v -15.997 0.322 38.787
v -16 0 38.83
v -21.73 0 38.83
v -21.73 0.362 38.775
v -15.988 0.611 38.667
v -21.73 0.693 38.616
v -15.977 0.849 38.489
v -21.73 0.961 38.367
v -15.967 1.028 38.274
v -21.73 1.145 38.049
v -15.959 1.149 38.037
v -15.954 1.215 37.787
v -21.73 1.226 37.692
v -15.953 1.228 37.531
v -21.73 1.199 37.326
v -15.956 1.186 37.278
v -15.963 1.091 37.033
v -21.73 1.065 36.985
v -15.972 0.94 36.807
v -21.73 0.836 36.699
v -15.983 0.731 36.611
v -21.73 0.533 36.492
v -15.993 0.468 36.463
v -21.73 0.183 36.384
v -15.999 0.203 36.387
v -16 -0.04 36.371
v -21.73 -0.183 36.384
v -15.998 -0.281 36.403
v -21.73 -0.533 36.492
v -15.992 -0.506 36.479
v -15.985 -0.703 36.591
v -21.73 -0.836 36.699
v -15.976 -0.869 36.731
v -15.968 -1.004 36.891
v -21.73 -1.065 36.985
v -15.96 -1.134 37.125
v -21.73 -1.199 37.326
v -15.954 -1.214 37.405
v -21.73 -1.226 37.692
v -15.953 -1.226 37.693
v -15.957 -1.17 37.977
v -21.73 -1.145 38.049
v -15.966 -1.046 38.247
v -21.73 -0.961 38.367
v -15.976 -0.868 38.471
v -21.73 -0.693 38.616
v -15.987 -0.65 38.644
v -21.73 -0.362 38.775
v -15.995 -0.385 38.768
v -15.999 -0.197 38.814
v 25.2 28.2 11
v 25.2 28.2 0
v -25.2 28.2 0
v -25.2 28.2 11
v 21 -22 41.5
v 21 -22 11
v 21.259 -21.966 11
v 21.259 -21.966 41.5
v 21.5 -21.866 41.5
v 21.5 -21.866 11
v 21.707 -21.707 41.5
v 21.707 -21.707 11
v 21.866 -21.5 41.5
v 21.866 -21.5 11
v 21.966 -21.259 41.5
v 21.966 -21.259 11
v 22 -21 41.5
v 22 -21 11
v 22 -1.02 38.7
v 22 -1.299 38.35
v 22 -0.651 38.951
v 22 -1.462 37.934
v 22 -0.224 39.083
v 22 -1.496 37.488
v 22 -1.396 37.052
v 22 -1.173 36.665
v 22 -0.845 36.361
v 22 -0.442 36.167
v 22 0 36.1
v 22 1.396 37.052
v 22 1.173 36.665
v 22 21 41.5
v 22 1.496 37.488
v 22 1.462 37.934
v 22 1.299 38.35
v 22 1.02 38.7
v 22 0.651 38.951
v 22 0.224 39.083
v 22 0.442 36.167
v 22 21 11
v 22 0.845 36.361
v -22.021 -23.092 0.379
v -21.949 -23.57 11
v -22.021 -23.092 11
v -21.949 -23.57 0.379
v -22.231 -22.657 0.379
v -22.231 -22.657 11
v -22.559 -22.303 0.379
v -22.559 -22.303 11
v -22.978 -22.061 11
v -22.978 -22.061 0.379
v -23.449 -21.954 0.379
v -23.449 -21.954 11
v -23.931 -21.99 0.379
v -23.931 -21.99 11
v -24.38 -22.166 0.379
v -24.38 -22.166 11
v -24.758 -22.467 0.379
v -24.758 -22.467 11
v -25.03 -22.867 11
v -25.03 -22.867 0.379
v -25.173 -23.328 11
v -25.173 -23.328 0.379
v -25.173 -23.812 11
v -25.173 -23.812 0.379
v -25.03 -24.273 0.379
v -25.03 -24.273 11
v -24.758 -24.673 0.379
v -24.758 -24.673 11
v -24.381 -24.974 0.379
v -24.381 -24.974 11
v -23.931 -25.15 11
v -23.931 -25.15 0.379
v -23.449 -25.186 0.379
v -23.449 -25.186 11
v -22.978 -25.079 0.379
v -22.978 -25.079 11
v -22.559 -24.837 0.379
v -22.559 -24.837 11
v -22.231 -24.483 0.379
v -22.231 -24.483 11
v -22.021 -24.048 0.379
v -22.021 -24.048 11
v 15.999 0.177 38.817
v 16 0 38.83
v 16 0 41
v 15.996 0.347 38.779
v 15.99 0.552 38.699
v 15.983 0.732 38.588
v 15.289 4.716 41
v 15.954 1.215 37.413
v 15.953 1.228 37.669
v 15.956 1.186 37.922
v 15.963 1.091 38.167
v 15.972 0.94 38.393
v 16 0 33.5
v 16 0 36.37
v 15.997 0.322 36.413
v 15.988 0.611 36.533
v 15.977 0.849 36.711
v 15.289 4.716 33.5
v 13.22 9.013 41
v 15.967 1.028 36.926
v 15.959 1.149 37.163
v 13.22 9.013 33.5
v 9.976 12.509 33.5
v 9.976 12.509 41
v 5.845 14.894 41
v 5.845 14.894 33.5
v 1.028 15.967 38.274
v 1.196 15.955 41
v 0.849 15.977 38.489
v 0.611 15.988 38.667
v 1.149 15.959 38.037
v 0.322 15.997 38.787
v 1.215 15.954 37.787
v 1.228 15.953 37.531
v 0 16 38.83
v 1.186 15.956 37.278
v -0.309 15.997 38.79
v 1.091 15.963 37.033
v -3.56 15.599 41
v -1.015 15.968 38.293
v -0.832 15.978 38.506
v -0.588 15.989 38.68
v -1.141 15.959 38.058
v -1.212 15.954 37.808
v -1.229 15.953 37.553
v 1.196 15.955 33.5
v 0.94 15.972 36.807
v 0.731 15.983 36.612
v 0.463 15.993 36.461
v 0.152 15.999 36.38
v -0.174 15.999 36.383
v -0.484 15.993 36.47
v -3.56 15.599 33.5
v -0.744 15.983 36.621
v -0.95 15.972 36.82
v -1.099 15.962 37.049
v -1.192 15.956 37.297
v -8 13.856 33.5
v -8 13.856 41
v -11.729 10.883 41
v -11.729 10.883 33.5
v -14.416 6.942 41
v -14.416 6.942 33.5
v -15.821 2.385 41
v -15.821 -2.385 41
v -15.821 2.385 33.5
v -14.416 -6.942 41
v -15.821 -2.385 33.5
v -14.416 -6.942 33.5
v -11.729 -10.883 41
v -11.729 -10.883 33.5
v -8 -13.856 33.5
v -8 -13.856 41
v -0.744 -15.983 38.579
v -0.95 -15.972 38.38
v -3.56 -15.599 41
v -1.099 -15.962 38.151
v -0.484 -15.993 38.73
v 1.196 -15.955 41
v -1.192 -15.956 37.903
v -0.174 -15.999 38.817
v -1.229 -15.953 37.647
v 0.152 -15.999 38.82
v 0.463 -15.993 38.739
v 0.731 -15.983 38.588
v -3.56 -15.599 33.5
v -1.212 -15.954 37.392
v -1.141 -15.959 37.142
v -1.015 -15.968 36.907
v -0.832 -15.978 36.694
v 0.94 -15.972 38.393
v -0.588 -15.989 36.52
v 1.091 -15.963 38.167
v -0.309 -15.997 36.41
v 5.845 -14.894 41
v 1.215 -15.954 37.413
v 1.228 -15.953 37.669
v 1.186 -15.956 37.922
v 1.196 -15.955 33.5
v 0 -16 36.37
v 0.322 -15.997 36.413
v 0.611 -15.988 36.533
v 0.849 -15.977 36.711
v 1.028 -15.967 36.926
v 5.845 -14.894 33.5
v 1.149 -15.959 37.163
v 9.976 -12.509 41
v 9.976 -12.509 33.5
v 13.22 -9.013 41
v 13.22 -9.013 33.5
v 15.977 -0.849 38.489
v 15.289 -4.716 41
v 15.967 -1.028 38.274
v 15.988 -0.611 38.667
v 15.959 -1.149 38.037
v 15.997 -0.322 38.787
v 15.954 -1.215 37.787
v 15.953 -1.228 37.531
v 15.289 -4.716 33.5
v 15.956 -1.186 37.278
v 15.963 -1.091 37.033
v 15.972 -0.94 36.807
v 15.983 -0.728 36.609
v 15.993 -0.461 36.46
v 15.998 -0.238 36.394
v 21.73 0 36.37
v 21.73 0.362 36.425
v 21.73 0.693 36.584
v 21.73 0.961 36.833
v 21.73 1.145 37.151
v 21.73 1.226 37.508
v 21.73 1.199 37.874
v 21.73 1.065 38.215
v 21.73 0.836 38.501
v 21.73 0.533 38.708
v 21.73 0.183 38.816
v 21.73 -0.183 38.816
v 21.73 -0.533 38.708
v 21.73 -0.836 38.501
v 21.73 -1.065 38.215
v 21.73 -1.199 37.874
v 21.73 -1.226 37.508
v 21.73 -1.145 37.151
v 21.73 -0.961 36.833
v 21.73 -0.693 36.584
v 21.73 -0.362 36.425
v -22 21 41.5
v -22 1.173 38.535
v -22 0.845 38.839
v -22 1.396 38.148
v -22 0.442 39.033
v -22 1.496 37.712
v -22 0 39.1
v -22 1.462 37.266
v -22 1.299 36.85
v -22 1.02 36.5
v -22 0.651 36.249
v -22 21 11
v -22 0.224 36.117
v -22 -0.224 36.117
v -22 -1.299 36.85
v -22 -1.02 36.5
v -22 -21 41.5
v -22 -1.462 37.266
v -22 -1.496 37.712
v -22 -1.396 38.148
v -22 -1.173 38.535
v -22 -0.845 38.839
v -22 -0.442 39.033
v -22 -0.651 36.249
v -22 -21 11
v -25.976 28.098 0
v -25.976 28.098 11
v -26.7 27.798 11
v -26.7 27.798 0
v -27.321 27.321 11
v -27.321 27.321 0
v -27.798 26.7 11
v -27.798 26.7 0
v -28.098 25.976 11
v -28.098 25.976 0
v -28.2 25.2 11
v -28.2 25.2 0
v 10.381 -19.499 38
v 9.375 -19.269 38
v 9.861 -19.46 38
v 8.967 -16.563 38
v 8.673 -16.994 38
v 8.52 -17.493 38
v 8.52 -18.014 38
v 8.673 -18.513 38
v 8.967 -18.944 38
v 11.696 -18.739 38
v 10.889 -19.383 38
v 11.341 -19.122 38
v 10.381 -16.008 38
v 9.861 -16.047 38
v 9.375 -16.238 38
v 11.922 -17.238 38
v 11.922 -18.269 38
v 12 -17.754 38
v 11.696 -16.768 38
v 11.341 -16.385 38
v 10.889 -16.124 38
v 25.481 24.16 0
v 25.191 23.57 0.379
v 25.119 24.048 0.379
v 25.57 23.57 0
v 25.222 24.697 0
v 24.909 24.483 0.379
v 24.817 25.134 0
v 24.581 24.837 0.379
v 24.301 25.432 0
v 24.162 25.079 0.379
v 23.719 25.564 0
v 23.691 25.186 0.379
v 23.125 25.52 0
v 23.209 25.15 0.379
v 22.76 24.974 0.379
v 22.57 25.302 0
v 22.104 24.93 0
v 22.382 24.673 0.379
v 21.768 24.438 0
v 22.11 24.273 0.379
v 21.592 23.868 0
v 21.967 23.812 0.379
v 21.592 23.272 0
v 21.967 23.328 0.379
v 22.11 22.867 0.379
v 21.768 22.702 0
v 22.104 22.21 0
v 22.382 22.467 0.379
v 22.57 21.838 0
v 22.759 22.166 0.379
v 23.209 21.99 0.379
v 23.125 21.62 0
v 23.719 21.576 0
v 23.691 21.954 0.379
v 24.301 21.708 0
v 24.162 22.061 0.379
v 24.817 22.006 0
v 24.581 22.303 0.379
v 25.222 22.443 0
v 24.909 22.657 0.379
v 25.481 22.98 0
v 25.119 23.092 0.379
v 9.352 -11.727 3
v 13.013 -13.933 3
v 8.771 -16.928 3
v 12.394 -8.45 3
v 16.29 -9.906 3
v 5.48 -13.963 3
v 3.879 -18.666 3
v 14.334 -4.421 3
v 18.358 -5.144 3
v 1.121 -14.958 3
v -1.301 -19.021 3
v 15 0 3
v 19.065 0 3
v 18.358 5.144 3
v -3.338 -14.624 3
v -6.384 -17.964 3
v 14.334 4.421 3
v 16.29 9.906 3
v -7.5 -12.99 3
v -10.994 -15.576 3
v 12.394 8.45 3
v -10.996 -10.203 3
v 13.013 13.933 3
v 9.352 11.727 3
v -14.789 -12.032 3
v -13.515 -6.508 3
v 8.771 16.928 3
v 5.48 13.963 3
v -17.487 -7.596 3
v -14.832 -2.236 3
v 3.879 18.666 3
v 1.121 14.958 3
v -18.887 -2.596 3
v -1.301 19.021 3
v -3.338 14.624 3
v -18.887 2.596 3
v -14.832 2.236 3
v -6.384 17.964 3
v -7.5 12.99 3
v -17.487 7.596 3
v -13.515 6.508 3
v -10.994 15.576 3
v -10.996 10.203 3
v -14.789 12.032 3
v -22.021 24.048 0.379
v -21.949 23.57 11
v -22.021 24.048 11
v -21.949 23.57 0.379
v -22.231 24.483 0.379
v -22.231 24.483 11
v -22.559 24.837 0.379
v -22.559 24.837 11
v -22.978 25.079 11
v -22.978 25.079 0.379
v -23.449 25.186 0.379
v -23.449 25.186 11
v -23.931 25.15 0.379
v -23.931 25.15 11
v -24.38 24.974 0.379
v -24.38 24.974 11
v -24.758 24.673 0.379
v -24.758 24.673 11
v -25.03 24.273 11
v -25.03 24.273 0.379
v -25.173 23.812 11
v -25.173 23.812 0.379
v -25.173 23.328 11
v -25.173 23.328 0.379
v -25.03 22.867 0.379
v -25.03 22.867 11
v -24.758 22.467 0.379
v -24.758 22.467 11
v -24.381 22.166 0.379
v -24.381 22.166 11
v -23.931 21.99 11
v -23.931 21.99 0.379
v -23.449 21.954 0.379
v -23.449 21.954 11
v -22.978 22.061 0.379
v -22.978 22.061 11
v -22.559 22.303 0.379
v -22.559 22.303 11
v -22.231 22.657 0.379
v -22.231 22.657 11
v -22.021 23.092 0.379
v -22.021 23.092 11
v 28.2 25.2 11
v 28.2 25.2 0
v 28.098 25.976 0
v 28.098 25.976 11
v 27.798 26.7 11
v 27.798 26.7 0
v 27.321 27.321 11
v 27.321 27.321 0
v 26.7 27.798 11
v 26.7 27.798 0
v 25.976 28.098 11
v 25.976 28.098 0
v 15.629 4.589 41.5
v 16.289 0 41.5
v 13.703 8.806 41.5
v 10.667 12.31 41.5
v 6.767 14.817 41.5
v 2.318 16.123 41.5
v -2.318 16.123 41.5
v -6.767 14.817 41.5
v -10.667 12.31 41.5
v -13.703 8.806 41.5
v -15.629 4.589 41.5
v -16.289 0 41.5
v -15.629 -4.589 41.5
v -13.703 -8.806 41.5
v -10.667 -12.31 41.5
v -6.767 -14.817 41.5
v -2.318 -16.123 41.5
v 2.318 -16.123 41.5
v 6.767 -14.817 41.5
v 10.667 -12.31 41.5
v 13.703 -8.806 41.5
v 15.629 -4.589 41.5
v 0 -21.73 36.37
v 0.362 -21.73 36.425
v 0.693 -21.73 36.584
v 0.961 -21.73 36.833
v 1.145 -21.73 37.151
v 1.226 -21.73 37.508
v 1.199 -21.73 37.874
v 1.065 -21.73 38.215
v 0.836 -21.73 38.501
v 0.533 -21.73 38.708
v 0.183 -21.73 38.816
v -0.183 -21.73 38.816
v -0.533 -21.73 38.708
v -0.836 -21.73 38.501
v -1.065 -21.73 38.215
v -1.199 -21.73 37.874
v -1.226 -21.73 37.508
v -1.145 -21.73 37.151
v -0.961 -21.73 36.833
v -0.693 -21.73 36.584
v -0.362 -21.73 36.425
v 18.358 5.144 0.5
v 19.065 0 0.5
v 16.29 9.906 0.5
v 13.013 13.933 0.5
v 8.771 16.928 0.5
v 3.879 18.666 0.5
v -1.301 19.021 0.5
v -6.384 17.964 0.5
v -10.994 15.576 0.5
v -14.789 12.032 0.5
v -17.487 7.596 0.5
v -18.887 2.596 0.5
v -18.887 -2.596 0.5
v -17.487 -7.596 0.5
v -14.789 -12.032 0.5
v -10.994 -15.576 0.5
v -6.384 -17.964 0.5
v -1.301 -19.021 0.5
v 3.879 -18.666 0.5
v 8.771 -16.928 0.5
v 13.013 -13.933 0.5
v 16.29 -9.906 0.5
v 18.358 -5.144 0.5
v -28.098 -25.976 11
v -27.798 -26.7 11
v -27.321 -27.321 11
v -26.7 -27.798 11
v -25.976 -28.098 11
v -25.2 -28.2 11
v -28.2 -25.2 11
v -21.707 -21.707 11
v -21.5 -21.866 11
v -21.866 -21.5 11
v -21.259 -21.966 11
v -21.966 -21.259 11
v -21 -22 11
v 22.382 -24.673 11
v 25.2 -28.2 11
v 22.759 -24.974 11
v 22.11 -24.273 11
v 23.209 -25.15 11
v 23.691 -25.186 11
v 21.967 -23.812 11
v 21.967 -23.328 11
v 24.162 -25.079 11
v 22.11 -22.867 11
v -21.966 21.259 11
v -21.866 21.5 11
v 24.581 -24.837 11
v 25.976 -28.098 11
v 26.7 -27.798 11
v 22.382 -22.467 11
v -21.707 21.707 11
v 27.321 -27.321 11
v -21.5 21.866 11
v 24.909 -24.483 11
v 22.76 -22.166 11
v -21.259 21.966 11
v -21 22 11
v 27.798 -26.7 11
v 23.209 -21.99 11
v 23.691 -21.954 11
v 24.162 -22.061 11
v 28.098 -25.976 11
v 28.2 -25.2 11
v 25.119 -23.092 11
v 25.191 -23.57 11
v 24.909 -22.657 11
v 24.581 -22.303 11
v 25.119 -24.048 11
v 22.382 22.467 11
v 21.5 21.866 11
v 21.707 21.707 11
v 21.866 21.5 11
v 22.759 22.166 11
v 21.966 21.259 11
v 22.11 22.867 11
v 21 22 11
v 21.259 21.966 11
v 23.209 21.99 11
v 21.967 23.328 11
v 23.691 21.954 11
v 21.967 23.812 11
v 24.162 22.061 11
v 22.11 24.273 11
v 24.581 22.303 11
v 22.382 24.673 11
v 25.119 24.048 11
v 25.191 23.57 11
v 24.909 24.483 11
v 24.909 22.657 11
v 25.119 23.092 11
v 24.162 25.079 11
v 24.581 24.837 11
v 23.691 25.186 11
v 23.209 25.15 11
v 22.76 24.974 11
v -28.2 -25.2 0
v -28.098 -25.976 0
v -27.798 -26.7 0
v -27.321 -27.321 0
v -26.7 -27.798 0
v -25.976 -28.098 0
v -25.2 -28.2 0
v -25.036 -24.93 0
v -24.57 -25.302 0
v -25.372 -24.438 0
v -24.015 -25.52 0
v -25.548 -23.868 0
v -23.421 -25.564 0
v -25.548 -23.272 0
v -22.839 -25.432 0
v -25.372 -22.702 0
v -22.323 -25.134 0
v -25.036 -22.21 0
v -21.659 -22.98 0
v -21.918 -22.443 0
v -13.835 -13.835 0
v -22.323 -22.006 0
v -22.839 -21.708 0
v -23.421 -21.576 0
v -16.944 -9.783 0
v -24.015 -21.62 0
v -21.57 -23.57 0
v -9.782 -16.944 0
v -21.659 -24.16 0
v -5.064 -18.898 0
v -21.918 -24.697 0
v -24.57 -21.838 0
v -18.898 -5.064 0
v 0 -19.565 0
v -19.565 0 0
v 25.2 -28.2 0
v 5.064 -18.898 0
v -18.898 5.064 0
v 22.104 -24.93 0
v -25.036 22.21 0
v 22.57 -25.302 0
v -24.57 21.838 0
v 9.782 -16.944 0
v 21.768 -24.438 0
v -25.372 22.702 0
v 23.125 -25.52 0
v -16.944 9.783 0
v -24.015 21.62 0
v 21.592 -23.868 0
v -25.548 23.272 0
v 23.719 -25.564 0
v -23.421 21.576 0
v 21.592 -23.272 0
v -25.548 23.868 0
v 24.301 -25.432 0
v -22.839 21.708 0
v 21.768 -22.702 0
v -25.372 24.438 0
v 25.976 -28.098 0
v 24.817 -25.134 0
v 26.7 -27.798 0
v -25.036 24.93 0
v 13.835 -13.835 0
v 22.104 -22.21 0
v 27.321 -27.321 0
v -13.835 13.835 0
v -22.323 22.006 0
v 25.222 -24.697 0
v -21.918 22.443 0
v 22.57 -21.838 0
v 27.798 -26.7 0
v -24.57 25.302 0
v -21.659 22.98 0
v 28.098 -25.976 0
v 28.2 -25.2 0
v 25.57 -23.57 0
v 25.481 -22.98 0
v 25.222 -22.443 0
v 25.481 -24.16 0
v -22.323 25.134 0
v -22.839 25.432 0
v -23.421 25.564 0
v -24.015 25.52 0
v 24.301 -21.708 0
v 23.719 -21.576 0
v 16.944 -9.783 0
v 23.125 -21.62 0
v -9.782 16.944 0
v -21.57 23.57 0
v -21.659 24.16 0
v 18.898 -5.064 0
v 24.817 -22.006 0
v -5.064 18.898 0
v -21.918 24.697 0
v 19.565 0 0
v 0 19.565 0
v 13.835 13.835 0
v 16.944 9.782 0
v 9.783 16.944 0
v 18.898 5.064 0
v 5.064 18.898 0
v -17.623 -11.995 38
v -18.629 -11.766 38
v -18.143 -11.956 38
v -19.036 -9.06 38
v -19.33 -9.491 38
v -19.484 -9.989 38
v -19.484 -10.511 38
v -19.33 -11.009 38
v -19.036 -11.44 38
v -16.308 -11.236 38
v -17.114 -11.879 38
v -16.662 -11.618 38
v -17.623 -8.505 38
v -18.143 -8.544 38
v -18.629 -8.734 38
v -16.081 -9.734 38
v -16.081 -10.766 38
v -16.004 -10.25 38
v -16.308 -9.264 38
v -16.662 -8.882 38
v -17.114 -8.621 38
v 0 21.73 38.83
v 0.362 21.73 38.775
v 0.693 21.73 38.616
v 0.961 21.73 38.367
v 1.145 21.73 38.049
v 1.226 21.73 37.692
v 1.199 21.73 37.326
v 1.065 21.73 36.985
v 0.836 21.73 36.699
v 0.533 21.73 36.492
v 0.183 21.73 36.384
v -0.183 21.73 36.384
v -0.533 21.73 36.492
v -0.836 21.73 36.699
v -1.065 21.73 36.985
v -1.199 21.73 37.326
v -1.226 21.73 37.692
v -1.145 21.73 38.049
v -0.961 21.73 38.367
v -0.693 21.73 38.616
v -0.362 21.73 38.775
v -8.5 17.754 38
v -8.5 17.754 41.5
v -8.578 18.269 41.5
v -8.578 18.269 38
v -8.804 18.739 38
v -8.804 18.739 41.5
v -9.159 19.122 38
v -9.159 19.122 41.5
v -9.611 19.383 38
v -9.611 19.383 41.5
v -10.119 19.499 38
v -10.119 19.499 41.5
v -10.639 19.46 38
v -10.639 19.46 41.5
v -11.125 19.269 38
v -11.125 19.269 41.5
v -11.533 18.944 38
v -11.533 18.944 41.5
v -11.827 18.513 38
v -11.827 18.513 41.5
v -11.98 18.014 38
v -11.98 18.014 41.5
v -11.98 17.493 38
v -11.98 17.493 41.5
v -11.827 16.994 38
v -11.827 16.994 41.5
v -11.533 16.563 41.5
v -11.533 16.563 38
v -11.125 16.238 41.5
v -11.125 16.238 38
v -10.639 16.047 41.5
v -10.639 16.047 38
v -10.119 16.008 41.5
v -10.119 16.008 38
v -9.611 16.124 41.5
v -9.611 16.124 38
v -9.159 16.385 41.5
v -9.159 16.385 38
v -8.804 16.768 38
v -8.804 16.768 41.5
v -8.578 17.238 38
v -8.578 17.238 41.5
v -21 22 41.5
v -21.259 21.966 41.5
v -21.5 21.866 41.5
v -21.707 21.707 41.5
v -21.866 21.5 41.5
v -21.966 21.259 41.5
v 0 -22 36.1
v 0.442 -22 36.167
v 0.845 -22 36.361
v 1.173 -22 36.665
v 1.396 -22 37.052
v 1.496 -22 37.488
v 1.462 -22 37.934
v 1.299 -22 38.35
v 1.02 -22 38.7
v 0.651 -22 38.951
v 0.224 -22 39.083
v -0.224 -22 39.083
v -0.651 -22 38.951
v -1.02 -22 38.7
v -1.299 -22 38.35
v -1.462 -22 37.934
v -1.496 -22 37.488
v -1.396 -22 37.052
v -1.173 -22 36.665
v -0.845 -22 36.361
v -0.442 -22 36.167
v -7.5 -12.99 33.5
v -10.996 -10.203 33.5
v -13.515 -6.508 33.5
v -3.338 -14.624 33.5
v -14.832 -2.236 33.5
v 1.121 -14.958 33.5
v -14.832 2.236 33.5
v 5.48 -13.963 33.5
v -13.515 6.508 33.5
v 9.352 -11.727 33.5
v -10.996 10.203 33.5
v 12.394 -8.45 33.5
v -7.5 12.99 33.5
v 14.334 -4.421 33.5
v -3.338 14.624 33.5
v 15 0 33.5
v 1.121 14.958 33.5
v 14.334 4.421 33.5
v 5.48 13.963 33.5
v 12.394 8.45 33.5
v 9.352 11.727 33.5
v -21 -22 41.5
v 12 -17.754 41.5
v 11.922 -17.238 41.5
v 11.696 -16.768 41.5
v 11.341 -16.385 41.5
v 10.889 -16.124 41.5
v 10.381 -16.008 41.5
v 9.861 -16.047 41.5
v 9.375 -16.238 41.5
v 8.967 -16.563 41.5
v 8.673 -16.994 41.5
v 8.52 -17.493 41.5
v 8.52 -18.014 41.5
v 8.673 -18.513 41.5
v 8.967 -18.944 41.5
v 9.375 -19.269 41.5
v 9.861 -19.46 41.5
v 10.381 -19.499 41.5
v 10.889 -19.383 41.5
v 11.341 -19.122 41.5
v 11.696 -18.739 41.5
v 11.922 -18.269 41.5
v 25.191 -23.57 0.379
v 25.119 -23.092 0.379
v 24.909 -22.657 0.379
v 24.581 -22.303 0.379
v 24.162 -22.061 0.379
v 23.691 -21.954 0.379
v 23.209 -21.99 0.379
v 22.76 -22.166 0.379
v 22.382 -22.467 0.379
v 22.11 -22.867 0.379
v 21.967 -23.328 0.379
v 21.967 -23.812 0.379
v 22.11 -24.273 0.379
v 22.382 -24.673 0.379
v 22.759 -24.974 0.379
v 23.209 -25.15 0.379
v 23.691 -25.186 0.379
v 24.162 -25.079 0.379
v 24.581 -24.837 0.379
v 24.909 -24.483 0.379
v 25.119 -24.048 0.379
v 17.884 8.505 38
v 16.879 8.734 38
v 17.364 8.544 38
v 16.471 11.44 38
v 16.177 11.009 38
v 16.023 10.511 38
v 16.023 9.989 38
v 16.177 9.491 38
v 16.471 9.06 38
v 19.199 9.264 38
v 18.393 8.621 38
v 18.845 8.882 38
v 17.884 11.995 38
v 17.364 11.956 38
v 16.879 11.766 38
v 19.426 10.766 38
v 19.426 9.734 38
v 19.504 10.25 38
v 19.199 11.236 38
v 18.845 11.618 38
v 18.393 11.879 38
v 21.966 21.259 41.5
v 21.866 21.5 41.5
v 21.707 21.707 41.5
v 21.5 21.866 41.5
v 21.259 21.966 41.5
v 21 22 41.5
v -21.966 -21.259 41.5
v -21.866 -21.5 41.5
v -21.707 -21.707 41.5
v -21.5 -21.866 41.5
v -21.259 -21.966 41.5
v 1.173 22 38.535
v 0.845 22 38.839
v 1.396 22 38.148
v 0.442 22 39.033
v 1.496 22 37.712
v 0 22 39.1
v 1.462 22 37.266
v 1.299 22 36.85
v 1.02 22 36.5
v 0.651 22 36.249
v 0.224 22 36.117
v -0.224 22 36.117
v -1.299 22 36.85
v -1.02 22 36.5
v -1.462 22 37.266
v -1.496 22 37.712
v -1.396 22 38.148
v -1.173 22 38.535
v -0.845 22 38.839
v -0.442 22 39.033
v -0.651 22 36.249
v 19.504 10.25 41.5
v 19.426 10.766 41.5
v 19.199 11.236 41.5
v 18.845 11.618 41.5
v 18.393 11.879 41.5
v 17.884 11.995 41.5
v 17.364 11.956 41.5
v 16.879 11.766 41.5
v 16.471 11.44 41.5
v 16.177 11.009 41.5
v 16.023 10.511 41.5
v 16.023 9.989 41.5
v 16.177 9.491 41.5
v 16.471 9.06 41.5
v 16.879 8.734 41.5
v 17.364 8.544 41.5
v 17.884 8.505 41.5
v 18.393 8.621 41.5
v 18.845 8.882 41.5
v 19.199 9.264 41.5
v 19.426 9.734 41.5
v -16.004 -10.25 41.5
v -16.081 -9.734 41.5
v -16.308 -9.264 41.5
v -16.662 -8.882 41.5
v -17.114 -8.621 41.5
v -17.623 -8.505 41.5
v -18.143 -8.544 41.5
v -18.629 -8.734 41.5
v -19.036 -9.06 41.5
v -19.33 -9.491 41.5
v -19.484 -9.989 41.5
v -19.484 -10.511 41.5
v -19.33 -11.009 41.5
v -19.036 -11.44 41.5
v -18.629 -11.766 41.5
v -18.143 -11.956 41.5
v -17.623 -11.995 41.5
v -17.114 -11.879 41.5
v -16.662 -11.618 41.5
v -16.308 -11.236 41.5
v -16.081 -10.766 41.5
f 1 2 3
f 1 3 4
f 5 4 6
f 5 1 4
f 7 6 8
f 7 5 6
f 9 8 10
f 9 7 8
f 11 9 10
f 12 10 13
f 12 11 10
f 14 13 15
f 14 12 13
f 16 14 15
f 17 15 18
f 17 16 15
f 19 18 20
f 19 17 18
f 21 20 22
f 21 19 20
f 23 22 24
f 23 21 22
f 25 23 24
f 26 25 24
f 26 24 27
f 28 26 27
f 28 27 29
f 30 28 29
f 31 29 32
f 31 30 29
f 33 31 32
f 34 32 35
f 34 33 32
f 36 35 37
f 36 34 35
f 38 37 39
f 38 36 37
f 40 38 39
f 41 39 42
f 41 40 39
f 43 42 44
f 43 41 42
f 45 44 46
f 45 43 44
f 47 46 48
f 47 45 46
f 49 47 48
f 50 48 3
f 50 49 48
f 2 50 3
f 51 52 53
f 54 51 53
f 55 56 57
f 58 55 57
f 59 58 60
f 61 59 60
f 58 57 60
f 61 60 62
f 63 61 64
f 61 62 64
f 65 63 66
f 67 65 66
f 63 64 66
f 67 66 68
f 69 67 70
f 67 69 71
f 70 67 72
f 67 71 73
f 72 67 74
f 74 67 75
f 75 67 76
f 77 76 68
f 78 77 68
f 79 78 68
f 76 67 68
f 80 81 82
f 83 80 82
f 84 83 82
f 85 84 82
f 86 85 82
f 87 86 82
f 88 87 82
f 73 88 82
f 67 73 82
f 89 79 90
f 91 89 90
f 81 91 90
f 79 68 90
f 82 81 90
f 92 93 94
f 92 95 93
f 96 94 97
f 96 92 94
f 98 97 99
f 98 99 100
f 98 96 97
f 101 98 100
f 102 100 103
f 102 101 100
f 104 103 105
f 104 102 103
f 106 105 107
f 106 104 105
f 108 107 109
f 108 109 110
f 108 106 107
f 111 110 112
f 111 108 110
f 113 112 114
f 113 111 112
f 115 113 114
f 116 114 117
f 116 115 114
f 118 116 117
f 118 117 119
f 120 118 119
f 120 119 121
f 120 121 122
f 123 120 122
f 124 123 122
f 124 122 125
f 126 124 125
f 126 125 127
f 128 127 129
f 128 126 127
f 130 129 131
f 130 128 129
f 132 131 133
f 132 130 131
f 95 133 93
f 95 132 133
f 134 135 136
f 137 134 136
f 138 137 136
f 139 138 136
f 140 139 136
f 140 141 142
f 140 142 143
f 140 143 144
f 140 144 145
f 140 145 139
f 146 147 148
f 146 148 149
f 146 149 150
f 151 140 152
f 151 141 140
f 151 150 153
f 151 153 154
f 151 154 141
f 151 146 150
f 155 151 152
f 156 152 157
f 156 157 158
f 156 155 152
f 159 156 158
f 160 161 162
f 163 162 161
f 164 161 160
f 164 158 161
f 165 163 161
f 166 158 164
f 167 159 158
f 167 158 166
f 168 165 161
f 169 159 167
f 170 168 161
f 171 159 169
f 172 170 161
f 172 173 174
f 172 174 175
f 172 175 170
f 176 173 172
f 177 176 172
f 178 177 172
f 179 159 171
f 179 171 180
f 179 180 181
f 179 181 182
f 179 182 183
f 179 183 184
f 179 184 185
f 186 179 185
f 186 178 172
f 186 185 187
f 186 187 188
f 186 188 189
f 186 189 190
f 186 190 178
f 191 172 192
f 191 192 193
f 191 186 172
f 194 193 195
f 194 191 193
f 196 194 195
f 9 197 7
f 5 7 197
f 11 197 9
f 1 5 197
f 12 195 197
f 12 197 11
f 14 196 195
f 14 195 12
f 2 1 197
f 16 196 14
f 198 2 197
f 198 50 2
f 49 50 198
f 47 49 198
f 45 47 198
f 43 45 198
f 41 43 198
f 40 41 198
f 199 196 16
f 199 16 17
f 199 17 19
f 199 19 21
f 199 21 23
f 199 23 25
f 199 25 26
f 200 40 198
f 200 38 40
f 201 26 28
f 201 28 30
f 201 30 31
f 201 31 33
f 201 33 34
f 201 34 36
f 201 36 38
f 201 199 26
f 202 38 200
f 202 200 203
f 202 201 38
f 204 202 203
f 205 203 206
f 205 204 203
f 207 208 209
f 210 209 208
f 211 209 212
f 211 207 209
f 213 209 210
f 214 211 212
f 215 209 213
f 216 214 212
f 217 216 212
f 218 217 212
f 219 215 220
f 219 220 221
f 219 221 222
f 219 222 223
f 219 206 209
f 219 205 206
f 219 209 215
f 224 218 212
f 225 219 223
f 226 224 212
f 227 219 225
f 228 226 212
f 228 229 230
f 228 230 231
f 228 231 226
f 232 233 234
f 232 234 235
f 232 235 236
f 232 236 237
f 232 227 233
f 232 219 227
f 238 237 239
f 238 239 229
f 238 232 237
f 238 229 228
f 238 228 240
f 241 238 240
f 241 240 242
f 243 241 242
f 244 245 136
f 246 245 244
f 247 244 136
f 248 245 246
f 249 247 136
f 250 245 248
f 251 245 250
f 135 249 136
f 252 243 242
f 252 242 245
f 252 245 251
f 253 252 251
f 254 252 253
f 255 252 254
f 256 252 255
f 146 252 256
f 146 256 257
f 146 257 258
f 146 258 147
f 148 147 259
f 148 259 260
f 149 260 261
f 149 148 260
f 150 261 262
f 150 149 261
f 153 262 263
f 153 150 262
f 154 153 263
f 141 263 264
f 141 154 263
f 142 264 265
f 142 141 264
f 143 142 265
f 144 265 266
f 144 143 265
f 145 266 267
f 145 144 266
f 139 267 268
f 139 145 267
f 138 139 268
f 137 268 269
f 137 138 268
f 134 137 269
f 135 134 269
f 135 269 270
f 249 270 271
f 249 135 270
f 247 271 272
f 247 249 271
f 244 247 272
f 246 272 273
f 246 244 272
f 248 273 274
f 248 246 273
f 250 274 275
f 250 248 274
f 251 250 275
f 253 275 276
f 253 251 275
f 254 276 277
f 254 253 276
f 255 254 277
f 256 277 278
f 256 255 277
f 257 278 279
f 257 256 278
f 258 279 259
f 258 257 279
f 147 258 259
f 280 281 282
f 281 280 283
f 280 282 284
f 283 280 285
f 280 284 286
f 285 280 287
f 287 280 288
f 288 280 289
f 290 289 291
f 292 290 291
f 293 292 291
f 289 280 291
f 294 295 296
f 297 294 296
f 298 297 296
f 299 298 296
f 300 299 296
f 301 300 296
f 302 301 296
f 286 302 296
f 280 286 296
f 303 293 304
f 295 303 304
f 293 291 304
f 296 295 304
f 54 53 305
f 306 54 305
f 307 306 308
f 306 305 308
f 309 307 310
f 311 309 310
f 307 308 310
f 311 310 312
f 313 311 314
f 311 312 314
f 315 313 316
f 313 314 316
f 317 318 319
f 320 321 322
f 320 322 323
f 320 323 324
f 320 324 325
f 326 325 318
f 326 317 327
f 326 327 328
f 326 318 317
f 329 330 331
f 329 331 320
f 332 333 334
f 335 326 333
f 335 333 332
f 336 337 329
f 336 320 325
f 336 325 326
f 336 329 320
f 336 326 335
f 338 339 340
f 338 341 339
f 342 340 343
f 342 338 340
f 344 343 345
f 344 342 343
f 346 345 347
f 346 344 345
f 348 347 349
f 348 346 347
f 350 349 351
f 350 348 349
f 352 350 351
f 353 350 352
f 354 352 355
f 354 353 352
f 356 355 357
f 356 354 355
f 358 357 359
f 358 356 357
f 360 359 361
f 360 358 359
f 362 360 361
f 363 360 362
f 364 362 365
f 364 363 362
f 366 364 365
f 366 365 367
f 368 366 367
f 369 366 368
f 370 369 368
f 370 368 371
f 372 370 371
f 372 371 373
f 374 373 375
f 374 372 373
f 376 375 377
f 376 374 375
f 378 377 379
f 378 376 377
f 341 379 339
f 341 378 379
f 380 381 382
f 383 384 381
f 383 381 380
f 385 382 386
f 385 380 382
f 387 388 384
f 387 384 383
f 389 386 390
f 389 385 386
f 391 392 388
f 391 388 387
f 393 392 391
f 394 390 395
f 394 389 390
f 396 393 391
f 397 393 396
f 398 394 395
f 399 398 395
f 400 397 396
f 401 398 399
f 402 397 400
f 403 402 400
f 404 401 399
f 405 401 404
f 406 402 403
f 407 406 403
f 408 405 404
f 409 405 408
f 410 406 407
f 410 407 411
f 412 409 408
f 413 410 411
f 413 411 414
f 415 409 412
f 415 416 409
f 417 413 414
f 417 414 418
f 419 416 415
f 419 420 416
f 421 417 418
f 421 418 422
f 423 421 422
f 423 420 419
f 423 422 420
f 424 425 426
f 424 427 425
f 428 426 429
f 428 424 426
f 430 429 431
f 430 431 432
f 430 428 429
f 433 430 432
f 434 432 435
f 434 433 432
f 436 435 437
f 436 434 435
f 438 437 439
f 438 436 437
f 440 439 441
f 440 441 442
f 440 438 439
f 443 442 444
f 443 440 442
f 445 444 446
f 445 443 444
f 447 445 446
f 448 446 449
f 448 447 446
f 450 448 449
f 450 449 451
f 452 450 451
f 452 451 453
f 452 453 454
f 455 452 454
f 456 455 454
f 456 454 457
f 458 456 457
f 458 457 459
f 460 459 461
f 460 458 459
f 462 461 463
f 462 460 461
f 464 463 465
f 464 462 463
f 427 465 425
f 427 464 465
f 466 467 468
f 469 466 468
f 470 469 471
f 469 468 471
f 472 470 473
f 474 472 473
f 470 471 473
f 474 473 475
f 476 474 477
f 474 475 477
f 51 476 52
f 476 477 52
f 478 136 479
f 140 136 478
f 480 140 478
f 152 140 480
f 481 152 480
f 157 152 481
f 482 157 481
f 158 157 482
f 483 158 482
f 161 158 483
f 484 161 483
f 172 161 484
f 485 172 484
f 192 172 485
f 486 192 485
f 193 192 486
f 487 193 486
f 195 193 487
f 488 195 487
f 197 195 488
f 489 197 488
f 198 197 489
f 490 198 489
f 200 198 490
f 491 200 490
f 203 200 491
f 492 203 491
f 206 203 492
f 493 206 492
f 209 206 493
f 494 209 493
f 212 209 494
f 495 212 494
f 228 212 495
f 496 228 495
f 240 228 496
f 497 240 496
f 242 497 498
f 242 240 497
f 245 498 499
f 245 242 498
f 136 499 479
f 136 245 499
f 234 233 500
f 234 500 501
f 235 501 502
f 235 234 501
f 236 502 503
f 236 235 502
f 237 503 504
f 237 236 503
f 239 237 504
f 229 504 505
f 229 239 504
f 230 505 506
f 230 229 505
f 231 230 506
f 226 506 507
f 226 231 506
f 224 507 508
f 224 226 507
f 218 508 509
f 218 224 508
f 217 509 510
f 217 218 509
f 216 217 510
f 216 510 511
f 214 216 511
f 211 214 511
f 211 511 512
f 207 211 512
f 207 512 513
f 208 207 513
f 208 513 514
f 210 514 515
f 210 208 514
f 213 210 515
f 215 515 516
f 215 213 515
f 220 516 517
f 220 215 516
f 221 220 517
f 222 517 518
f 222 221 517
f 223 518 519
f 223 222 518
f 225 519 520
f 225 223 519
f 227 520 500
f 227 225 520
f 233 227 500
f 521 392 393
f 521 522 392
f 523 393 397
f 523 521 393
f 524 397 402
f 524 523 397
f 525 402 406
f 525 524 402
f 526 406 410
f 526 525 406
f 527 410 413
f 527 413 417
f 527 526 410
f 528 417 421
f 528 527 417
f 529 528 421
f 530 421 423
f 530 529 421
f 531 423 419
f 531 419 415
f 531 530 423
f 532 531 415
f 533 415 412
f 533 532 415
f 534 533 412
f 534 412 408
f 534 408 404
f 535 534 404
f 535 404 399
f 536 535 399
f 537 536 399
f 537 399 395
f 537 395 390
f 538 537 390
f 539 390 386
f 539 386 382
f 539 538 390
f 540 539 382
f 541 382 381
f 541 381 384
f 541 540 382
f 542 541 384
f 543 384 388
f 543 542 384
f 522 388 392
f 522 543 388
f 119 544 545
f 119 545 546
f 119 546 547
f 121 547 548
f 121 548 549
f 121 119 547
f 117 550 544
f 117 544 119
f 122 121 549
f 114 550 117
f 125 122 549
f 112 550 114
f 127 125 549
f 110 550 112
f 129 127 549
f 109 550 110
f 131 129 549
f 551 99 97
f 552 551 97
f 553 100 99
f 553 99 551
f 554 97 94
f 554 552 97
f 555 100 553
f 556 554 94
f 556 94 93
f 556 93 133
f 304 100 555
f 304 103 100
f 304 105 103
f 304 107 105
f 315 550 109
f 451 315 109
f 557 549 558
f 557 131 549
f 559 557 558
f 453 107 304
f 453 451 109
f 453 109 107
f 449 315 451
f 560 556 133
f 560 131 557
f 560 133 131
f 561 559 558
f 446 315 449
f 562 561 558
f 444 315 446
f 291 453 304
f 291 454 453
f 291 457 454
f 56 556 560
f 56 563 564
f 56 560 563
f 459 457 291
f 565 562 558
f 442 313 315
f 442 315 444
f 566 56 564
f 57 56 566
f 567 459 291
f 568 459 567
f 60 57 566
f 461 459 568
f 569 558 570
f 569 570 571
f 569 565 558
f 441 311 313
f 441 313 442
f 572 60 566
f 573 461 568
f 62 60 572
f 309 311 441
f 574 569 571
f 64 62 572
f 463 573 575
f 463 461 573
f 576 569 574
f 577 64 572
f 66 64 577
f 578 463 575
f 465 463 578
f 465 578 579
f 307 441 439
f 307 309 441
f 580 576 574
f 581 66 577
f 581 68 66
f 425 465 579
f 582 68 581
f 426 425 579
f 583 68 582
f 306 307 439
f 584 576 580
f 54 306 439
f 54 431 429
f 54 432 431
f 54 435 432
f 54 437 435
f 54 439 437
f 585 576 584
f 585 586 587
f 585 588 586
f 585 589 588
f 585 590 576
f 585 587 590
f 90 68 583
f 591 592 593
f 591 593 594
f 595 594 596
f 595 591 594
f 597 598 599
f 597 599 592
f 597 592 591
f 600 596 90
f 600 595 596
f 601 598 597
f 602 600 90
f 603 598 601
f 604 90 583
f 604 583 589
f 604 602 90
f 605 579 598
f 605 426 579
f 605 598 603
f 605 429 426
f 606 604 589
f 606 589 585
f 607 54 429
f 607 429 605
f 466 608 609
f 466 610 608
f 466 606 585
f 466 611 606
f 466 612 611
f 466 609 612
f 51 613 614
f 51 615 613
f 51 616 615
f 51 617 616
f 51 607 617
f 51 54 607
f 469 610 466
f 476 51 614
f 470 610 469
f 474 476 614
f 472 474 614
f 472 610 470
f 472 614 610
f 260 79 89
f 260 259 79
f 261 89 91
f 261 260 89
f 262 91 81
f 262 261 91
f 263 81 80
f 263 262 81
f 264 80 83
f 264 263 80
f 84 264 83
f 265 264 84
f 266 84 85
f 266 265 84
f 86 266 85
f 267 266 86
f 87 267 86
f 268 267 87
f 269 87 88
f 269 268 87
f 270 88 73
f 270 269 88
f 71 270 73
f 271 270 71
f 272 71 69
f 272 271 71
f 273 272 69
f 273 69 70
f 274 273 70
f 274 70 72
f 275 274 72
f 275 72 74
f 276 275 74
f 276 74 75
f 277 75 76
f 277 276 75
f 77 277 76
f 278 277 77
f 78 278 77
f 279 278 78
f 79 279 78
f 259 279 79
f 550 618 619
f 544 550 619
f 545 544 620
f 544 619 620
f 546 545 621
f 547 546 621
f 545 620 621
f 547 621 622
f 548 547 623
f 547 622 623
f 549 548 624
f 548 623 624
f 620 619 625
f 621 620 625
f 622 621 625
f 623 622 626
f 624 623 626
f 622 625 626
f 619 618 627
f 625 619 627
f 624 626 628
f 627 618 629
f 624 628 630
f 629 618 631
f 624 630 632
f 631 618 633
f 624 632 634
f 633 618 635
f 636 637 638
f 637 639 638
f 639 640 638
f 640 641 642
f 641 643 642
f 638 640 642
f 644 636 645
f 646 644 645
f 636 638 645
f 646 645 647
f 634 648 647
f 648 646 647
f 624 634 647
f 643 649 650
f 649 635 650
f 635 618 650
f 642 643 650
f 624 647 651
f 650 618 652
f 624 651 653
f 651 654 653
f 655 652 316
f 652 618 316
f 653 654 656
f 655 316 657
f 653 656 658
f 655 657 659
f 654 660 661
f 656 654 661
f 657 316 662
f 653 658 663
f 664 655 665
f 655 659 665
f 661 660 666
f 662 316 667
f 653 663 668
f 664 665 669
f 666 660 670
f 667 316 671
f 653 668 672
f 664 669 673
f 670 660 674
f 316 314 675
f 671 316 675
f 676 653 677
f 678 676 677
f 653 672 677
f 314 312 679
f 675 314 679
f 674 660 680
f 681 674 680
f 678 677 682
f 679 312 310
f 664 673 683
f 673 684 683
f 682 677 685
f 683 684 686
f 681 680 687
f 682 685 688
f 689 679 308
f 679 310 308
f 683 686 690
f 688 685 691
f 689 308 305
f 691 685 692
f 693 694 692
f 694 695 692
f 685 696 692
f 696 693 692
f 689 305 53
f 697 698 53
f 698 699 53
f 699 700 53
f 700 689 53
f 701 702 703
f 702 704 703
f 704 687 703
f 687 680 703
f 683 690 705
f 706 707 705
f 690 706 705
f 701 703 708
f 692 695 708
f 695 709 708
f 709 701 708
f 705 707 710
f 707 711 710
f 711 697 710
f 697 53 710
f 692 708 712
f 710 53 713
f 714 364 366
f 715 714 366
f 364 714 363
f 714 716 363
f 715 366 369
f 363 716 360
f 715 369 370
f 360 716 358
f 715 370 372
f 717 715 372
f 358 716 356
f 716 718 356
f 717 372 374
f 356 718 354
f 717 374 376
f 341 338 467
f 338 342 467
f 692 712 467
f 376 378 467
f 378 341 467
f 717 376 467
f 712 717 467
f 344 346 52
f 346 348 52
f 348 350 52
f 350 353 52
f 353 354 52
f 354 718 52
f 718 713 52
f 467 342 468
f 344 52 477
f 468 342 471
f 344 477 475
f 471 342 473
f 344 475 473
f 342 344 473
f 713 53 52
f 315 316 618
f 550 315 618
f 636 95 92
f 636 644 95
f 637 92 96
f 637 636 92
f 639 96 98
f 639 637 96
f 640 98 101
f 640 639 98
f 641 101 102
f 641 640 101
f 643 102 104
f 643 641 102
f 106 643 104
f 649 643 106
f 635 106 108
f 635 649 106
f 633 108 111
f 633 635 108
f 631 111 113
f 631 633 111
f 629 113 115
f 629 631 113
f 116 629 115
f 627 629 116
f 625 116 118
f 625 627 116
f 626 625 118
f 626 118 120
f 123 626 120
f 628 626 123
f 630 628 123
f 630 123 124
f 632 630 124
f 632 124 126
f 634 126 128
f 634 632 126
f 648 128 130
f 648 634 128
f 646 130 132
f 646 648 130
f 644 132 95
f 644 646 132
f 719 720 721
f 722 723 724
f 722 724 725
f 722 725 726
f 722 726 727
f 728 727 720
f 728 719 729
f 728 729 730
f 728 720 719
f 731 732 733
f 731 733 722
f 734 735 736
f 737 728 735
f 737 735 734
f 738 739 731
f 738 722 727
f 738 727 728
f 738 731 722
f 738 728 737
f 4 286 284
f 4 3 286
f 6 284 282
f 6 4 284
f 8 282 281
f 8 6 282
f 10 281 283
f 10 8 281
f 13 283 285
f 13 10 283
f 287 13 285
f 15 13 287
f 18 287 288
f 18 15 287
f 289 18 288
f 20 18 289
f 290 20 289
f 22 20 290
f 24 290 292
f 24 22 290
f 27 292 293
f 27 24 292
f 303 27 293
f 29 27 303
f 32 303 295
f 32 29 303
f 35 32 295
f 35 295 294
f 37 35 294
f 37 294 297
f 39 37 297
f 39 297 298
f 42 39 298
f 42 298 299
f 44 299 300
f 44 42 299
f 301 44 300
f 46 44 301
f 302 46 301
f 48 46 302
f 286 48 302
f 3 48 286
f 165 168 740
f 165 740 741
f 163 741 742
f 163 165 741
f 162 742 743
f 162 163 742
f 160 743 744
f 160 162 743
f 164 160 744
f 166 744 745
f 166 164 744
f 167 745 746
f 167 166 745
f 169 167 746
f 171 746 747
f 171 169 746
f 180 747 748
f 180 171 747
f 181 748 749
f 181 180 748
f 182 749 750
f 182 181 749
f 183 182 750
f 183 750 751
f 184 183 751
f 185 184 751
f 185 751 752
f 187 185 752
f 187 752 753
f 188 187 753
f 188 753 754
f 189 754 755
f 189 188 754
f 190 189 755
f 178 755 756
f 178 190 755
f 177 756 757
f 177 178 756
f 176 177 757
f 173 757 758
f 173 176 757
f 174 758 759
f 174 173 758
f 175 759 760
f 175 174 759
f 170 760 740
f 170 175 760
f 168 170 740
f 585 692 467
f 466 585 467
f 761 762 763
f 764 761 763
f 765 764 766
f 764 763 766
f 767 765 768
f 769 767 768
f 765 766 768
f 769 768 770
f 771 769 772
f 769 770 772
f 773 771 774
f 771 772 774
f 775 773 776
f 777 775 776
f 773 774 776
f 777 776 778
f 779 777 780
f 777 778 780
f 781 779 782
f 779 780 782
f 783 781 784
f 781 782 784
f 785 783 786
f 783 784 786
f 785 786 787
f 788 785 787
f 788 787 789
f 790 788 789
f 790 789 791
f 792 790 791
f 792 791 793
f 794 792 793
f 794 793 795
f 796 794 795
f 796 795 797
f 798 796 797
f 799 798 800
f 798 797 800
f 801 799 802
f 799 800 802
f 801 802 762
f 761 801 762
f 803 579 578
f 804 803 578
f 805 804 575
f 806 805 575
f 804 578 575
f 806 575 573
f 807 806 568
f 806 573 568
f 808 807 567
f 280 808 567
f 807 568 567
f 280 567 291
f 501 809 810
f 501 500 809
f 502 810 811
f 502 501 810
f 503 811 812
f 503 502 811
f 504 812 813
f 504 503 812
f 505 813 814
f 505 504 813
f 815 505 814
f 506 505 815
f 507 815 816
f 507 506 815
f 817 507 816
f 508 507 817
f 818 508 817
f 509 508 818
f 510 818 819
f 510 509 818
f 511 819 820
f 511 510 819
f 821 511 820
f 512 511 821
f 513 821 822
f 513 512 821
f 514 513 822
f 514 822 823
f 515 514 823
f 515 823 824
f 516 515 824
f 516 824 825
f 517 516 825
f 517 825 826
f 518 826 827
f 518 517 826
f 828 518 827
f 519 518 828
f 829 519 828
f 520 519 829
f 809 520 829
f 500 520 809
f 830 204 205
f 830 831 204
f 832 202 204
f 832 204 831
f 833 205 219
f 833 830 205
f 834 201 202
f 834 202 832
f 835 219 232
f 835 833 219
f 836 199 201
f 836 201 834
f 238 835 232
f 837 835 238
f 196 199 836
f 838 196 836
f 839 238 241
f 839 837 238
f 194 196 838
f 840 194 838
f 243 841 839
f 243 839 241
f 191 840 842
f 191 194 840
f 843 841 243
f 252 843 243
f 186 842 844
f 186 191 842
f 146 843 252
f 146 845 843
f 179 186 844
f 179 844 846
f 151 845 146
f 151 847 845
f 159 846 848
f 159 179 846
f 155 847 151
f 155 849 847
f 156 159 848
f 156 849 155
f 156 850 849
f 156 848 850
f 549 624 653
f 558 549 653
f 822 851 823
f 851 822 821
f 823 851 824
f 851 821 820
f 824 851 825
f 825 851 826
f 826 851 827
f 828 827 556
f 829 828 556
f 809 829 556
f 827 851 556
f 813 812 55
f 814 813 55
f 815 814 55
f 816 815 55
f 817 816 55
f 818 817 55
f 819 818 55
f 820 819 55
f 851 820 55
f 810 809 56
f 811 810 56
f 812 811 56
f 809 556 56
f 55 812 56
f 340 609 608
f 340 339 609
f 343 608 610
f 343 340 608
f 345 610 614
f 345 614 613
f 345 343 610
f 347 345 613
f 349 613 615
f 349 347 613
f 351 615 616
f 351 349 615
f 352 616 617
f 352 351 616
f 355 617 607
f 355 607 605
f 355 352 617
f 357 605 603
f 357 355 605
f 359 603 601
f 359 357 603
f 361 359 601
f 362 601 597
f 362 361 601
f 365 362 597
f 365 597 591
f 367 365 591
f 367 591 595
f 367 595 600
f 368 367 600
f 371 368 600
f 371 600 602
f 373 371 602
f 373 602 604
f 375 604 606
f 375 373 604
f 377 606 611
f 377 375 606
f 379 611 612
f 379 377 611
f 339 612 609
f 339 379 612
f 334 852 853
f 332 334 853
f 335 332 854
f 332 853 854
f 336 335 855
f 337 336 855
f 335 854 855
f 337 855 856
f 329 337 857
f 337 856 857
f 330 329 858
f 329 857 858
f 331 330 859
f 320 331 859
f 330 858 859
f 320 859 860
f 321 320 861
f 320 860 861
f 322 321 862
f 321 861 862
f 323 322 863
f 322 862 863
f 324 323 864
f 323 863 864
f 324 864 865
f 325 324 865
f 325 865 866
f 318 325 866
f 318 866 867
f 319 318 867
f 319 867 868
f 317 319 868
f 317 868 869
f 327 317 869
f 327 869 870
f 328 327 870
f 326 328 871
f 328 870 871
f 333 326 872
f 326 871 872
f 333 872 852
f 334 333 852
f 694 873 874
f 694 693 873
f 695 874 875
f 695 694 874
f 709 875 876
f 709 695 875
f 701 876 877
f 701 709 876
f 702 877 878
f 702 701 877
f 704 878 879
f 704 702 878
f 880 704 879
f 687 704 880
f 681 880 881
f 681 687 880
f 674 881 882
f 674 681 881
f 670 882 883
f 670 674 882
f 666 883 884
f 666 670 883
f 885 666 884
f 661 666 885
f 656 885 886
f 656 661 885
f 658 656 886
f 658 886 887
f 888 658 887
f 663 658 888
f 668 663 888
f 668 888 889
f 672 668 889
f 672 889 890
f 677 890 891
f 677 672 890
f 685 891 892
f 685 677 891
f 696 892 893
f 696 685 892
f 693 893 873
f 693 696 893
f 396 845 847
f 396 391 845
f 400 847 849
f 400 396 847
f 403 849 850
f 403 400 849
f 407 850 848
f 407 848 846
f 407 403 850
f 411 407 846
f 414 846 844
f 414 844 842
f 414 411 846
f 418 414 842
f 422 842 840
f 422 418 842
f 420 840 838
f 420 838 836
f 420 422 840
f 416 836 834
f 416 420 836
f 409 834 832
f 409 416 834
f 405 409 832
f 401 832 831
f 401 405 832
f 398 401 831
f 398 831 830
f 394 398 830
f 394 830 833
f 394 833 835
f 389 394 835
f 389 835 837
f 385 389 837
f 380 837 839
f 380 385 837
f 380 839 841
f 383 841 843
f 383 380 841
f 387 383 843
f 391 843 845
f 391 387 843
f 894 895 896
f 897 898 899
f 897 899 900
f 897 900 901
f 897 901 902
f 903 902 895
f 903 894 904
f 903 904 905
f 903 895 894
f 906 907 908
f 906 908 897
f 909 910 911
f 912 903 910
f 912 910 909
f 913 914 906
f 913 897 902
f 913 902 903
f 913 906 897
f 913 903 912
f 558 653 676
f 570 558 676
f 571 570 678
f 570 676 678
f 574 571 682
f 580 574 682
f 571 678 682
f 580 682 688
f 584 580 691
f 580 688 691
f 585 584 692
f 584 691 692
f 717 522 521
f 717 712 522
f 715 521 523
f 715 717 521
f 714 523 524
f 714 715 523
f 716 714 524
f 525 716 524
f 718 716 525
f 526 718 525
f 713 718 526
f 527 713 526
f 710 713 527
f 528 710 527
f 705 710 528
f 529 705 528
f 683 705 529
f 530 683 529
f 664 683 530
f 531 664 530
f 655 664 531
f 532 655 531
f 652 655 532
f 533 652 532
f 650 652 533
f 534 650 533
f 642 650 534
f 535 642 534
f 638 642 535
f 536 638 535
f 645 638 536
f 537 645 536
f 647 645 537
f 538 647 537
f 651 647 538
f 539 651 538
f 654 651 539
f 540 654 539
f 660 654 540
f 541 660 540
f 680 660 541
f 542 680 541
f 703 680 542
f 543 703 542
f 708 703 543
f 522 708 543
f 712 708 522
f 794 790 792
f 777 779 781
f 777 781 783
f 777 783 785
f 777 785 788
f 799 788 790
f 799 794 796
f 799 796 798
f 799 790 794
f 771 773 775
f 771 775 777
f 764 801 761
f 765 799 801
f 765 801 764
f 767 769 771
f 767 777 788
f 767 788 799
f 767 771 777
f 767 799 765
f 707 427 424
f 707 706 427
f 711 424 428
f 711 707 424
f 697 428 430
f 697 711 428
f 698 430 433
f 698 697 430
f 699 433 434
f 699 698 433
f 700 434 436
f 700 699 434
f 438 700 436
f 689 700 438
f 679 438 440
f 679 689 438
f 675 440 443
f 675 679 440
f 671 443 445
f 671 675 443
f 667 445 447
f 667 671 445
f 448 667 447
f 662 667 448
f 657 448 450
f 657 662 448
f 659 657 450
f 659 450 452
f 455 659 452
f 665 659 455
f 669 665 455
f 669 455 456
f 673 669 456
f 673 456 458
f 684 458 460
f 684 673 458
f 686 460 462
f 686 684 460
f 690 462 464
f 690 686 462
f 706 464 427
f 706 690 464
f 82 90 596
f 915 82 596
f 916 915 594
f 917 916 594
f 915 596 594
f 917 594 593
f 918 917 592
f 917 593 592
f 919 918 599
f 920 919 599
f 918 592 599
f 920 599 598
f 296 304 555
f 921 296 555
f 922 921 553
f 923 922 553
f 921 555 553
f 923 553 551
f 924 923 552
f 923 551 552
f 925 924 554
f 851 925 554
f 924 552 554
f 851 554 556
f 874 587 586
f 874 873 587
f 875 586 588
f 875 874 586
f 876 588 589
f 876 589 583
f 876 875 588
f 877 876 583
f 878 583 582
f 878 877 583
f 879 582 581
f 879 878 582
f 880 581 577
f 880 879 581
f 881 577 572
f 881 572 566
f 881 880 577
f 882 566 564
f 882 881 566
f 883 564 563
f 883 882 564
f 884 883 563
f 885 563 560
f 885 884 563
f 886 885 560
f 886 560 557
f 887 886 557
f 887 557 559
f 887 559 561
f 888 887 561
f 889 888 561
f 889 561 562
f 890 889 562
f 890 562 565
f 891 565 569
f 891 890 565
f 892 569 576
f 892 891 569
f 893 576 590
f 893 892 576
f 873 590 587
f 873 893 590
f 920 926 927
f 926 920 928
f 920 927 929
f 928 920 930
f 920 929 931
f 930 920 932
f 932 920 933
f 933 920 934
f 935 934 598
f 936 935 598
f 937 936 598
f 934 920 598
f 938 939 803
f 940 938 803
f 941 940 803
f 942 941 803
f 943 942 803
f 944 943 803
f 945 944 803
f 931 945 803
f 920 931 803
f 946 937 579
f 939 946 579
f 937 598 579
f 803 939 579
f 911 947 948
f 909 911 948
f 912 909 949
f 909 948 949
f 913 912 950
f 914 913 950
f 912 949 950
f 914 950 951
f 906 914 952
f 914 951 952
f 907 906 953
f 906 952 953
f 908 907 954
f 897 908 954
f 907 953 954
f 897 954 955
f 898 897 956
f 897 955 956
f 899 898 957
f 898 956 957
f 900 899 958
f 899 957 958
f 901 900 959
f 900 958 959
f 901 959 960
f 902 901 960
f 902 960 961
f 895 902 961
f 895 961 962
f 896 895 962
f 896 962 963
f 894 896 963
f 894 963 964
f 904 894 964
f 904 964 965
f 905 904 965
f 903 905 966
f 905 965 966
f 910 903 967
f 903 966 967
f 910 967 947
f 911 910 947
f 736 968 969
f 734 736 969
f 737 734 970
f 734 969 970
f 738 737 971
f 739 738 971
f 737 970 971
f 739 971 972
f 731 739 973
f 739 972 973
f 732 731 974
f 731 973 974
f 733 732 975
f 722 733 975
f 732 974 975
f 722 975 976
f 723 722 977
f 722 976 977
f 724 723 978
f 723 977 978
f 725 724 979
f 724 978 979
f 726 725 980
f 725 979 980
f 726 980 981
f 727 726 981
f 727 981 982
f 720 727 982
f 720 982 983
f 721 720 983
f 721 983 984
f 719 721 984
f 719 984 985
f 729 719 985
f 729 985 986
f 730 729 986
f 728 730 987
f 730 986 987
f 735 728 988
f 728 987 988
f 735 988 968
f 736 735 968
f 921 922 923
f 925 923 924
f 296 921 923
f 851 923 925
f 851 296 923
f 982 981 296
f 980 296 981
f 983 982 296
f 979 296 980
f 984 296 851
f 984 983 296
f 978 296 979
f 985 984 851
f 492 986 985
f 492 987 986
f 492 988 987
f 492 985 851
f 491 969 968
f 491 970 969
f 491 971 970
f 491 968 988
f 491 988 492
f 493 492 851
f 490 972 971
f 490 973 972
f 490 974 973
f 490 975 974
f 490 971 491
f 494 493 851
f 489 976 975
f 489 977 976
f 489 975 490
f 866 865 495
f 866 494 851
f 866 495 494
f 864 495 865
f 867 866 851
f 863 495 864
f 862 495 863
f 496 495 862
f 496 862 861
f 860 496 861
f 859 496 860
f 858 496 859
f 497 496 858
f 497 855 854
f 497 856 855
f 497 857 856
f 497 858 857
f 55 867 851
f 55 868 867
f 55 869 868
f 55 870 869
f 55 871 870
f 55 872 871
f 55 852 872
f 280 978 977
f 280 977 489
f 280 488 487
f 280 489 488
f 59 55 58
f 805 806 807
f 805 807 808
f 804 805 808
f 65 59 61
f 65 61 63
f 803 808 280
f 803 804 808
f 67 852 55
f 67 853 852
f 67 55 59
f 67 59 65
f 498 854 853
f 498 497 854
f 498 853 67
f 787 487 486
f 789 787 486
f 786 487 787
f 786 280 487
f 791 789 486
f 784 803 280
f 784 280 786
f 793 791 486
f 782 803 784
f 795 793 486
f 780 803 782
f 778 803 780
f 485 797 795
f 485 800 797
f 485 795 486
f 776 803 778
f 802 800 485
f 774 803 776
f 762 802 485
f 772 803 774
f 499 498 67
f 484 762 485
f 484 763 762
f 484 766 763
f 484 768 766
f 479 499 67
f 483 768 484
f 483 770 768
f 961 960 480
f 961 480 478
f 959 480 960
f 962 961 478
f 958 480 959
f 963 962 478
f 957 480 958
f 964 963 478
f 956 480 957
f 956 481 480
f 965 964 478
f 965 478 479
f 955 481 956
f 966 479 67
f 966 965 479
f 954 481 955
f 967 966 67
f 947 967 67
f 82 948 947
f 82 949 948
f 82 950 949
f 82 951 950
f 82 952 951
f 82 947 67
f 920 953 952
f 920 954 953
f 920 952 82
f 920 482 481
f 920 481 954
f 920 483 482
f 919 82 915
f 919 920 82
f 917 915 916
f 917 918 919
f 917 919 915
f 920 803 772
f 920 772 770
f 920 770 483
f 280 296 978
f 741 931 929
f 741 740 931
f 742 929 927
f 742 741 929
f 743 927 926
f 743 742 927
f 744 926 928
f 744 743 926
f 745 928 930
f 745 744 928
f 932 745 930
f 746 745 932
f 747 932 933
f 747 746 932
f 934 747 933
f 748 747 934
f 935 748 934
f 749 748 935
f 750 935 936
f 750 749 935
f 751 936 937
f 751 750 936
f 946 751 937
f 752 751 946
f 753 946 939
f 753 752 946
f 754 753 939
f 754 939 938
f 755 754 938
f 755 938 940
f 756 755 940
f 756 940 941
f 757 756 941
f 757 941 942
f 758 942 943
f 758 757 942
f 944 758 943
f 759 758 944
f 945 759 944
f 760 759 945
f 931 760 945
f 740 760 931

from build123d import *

# Parameters (mm, degrees)
BOSS_EXTRUDE1_DEPTH  = 11
BOSS_EXTRUDE2_DEPTH  = 41.5
SKETCH4_R            = 1.75
CUT_EXTRUDE1_DEPTH   = 3.5
LPATTERN1_COUNT      = 2
LPATTERN1_PITCH      = 28.991378029
LPATTERN1_COUNT_DIR2 = 2
LPATTERN1_PITCH_DIR2 = 28.991378029
LPATTERN2_COUNT      = 2
LPATTERN2_PITCH      = 47.14
LPATTERN2_COUNT_DIR2 = 2
LPATTERN2_PITCH_DIR2 = 47.14


with BuildPart() as part:
    # Sketch1 → Boss-Extrude1 (new body)
    with BuildSketch(Plane.XY):
        with BuildLine():
            Line((-25.2, -28.2), (25.2, -28.2))
            ThreePointArc((25.2, -28.2), (27.321320344, -27.321320344), (28.2, -25.2))
            Line((28.2, -25.2), (28.2, 25.2))
            ThreePointArc((28.2, 25.2), (27.321320344, 27.321320344), (25.2, 28.2))
            Line((25.2, 28.2), (-25.2, 28.2))
            ThreePointArc((-25.2, 28.2), (-27.321320344, 27.321320344), (-28.2, 25.2))
            Line((-28.2, 25.2), (-28.2, -25.2))
            ThreePointArc((-28.2, -25.2), (-27.321320344, -27.321320344), (-25.2, -28.2))
        make_face()
    extrude(amount=BOSS_EXTRUDE1_DEPTH)

    # Sketch2 → Boss-Extrude2 (add)
    with BuildSketch(Plane.XY):
        with BuildLine():
            Line((-21, -22), (21, -22))
            ThreePointArc((21, -22), (21.707106781, -21.707106781), (22, -21))
            Line((22, -21), (22, 21))
            ThreePointArc((22, 21), (21.707106781, 21.707106781), (21, 22))
            Line((21, 22), (-21, 22))
            ThreePointArc((-21, 22), (-21.707106781, 21.707106781), (-22, 21))
            Line((-22, 21), (-22, -21))
            ThreePointArc((-22, -21), (-21.707106781, -21.707106781), (-21, -22))
        make_face()
    extrude(amount=BOSS_EXTRUDE2_DEPTH)

    # Sketch3 → Cut-Revolve1 (revolve, cut)
    with BuildSketch(Plane(origin=(0, 0, 0), x_dir=(0, 0, -1), z_dir=(1, 0, 0))):
        Polygon((-41.5, 0), (-41.5, 16.288675135), (-41, 16), (-33.5, 16), (-33.5, 15), (-3, 15), (-3, 19.065), (-0.5, 19.065), (0, 19.565), (0, 0), align=None)
    revolve(axis=Axis((0, 0, 0), (0, 0, 1)), mode=Mode.SUBTRACT)

    # Sketch4 → Cut-Extrude1 (cut)
    with BuildSketch(Plane.XY.offset(41.5)):
        with Locations((17.753520778, 10.25)):
            Circle(SKETCH4_R)
    cut_extrude1 = extrude(amount=-CUT_EXTRUDE1_DEPTH, mode=Mode.SUBTRACT)

    # LPattern1: Cut-Extrude1 2 × 2
    with Locations(*[Vector(-0.9659258262890682, 0.2588190451025211, 0) * (i * LPATTERN1_PITCH) + Vector(-0.2588190451025206, -0.9659258262890683, 0) * (j * LPATTERN1_PITCH_DIR2) for i in range(LPATTERN1_COUNT) for j in range(LPATTERN1_COUNT_DIR2) if (i, j) != (0, 0)]):
        add(cut_extrude1, mode=Mode.SUBTRACT)

    # Sketch6 → Cut-Revolve2 (revolve, cut)
    with BuildSketch(Plane(origin=(23.57, 0, 0), x_dir=(0, 0, -1), z_dir=(1, 0, 0))):
        Polygon((-11.935884786, 23.57), (-11, 25.191), (-0.379, 25.191), (0, 25.57), (0, 23.57), align=None)
    cut_revolve2 = revolve(axis=Axis((23.57, 23.57, 0), (0, 0, 1)), mode=Mode.SUBTRACT)

    # LPattern2: Cut-Revolve2 2 × 2
    with Locations(*[(-i * LPATTERN2_PITCH, -j * LPATTERN2_PITCH_DIR2, 0) for i in range(LPATTERN2_COUNT) for j in range(LPATTERN2_COUNT_DIR2) if (i, j) != (0, 0)]):
        add(cut_revolve2, mode=Mode.SUBTRACT)

    # Sketch8 → Cut-Revolve3 (revolve, cut)
    with BuildSketch(Plane.XY.offset(37.6)):
        Polygon((-22, 0), (-22, 1.5), (-21.7295, 1.2295), (-15.8, 1.2295), (-15.8, 0), align=None)
    revolve(axis=Axis((-15.8, 0, 37.6), (-1, 0, 0)), mode=Mode.SUBTRACT)

    # Sketch9 → Cut-Revolve4 (revolve, cut)
    with BuildSketch(Plane.XY.offset(37.6)):
        Polygon((0, -22), (-1.5, -22), (-1.2295, -21.7295), (-1.2295, -15.8), (0, -15.8), align=None)
    revolve(axis=Axis((0, -15.8, 37.6), (0, -1, 0)), mode=Mode.SUBTRACT)

    # Sketch10 → Cut-Revolve5 (revolve, cut)
    with BuildSketch(Plane.XY.offset(37.6)):
        Polygon((22, 0), (22, -1.5), (21.7295, -1.2295), (15.8, -1.2295), (15.8, 0), align=None)
    revolve(axis=Axis((15.8, 0, 37.6), (1, 0, 0)), mode=Mode.SUBTRACT)

    # Sketch11 → Cut-Revolve6 (revolve, cut)
    with BuildSketch(Plane.XY.offset(37.6)):
        Polygon((0, 22), (1.5, 22), (1.2295, 21.7295), (1.2295, 15.8), (0, 15.8), align=None)
    revolve(axis=Axis((0, 15.8, 37.6), (0, 1, 0)), mode=Mode.SUBTRACT)


solid = part.part
